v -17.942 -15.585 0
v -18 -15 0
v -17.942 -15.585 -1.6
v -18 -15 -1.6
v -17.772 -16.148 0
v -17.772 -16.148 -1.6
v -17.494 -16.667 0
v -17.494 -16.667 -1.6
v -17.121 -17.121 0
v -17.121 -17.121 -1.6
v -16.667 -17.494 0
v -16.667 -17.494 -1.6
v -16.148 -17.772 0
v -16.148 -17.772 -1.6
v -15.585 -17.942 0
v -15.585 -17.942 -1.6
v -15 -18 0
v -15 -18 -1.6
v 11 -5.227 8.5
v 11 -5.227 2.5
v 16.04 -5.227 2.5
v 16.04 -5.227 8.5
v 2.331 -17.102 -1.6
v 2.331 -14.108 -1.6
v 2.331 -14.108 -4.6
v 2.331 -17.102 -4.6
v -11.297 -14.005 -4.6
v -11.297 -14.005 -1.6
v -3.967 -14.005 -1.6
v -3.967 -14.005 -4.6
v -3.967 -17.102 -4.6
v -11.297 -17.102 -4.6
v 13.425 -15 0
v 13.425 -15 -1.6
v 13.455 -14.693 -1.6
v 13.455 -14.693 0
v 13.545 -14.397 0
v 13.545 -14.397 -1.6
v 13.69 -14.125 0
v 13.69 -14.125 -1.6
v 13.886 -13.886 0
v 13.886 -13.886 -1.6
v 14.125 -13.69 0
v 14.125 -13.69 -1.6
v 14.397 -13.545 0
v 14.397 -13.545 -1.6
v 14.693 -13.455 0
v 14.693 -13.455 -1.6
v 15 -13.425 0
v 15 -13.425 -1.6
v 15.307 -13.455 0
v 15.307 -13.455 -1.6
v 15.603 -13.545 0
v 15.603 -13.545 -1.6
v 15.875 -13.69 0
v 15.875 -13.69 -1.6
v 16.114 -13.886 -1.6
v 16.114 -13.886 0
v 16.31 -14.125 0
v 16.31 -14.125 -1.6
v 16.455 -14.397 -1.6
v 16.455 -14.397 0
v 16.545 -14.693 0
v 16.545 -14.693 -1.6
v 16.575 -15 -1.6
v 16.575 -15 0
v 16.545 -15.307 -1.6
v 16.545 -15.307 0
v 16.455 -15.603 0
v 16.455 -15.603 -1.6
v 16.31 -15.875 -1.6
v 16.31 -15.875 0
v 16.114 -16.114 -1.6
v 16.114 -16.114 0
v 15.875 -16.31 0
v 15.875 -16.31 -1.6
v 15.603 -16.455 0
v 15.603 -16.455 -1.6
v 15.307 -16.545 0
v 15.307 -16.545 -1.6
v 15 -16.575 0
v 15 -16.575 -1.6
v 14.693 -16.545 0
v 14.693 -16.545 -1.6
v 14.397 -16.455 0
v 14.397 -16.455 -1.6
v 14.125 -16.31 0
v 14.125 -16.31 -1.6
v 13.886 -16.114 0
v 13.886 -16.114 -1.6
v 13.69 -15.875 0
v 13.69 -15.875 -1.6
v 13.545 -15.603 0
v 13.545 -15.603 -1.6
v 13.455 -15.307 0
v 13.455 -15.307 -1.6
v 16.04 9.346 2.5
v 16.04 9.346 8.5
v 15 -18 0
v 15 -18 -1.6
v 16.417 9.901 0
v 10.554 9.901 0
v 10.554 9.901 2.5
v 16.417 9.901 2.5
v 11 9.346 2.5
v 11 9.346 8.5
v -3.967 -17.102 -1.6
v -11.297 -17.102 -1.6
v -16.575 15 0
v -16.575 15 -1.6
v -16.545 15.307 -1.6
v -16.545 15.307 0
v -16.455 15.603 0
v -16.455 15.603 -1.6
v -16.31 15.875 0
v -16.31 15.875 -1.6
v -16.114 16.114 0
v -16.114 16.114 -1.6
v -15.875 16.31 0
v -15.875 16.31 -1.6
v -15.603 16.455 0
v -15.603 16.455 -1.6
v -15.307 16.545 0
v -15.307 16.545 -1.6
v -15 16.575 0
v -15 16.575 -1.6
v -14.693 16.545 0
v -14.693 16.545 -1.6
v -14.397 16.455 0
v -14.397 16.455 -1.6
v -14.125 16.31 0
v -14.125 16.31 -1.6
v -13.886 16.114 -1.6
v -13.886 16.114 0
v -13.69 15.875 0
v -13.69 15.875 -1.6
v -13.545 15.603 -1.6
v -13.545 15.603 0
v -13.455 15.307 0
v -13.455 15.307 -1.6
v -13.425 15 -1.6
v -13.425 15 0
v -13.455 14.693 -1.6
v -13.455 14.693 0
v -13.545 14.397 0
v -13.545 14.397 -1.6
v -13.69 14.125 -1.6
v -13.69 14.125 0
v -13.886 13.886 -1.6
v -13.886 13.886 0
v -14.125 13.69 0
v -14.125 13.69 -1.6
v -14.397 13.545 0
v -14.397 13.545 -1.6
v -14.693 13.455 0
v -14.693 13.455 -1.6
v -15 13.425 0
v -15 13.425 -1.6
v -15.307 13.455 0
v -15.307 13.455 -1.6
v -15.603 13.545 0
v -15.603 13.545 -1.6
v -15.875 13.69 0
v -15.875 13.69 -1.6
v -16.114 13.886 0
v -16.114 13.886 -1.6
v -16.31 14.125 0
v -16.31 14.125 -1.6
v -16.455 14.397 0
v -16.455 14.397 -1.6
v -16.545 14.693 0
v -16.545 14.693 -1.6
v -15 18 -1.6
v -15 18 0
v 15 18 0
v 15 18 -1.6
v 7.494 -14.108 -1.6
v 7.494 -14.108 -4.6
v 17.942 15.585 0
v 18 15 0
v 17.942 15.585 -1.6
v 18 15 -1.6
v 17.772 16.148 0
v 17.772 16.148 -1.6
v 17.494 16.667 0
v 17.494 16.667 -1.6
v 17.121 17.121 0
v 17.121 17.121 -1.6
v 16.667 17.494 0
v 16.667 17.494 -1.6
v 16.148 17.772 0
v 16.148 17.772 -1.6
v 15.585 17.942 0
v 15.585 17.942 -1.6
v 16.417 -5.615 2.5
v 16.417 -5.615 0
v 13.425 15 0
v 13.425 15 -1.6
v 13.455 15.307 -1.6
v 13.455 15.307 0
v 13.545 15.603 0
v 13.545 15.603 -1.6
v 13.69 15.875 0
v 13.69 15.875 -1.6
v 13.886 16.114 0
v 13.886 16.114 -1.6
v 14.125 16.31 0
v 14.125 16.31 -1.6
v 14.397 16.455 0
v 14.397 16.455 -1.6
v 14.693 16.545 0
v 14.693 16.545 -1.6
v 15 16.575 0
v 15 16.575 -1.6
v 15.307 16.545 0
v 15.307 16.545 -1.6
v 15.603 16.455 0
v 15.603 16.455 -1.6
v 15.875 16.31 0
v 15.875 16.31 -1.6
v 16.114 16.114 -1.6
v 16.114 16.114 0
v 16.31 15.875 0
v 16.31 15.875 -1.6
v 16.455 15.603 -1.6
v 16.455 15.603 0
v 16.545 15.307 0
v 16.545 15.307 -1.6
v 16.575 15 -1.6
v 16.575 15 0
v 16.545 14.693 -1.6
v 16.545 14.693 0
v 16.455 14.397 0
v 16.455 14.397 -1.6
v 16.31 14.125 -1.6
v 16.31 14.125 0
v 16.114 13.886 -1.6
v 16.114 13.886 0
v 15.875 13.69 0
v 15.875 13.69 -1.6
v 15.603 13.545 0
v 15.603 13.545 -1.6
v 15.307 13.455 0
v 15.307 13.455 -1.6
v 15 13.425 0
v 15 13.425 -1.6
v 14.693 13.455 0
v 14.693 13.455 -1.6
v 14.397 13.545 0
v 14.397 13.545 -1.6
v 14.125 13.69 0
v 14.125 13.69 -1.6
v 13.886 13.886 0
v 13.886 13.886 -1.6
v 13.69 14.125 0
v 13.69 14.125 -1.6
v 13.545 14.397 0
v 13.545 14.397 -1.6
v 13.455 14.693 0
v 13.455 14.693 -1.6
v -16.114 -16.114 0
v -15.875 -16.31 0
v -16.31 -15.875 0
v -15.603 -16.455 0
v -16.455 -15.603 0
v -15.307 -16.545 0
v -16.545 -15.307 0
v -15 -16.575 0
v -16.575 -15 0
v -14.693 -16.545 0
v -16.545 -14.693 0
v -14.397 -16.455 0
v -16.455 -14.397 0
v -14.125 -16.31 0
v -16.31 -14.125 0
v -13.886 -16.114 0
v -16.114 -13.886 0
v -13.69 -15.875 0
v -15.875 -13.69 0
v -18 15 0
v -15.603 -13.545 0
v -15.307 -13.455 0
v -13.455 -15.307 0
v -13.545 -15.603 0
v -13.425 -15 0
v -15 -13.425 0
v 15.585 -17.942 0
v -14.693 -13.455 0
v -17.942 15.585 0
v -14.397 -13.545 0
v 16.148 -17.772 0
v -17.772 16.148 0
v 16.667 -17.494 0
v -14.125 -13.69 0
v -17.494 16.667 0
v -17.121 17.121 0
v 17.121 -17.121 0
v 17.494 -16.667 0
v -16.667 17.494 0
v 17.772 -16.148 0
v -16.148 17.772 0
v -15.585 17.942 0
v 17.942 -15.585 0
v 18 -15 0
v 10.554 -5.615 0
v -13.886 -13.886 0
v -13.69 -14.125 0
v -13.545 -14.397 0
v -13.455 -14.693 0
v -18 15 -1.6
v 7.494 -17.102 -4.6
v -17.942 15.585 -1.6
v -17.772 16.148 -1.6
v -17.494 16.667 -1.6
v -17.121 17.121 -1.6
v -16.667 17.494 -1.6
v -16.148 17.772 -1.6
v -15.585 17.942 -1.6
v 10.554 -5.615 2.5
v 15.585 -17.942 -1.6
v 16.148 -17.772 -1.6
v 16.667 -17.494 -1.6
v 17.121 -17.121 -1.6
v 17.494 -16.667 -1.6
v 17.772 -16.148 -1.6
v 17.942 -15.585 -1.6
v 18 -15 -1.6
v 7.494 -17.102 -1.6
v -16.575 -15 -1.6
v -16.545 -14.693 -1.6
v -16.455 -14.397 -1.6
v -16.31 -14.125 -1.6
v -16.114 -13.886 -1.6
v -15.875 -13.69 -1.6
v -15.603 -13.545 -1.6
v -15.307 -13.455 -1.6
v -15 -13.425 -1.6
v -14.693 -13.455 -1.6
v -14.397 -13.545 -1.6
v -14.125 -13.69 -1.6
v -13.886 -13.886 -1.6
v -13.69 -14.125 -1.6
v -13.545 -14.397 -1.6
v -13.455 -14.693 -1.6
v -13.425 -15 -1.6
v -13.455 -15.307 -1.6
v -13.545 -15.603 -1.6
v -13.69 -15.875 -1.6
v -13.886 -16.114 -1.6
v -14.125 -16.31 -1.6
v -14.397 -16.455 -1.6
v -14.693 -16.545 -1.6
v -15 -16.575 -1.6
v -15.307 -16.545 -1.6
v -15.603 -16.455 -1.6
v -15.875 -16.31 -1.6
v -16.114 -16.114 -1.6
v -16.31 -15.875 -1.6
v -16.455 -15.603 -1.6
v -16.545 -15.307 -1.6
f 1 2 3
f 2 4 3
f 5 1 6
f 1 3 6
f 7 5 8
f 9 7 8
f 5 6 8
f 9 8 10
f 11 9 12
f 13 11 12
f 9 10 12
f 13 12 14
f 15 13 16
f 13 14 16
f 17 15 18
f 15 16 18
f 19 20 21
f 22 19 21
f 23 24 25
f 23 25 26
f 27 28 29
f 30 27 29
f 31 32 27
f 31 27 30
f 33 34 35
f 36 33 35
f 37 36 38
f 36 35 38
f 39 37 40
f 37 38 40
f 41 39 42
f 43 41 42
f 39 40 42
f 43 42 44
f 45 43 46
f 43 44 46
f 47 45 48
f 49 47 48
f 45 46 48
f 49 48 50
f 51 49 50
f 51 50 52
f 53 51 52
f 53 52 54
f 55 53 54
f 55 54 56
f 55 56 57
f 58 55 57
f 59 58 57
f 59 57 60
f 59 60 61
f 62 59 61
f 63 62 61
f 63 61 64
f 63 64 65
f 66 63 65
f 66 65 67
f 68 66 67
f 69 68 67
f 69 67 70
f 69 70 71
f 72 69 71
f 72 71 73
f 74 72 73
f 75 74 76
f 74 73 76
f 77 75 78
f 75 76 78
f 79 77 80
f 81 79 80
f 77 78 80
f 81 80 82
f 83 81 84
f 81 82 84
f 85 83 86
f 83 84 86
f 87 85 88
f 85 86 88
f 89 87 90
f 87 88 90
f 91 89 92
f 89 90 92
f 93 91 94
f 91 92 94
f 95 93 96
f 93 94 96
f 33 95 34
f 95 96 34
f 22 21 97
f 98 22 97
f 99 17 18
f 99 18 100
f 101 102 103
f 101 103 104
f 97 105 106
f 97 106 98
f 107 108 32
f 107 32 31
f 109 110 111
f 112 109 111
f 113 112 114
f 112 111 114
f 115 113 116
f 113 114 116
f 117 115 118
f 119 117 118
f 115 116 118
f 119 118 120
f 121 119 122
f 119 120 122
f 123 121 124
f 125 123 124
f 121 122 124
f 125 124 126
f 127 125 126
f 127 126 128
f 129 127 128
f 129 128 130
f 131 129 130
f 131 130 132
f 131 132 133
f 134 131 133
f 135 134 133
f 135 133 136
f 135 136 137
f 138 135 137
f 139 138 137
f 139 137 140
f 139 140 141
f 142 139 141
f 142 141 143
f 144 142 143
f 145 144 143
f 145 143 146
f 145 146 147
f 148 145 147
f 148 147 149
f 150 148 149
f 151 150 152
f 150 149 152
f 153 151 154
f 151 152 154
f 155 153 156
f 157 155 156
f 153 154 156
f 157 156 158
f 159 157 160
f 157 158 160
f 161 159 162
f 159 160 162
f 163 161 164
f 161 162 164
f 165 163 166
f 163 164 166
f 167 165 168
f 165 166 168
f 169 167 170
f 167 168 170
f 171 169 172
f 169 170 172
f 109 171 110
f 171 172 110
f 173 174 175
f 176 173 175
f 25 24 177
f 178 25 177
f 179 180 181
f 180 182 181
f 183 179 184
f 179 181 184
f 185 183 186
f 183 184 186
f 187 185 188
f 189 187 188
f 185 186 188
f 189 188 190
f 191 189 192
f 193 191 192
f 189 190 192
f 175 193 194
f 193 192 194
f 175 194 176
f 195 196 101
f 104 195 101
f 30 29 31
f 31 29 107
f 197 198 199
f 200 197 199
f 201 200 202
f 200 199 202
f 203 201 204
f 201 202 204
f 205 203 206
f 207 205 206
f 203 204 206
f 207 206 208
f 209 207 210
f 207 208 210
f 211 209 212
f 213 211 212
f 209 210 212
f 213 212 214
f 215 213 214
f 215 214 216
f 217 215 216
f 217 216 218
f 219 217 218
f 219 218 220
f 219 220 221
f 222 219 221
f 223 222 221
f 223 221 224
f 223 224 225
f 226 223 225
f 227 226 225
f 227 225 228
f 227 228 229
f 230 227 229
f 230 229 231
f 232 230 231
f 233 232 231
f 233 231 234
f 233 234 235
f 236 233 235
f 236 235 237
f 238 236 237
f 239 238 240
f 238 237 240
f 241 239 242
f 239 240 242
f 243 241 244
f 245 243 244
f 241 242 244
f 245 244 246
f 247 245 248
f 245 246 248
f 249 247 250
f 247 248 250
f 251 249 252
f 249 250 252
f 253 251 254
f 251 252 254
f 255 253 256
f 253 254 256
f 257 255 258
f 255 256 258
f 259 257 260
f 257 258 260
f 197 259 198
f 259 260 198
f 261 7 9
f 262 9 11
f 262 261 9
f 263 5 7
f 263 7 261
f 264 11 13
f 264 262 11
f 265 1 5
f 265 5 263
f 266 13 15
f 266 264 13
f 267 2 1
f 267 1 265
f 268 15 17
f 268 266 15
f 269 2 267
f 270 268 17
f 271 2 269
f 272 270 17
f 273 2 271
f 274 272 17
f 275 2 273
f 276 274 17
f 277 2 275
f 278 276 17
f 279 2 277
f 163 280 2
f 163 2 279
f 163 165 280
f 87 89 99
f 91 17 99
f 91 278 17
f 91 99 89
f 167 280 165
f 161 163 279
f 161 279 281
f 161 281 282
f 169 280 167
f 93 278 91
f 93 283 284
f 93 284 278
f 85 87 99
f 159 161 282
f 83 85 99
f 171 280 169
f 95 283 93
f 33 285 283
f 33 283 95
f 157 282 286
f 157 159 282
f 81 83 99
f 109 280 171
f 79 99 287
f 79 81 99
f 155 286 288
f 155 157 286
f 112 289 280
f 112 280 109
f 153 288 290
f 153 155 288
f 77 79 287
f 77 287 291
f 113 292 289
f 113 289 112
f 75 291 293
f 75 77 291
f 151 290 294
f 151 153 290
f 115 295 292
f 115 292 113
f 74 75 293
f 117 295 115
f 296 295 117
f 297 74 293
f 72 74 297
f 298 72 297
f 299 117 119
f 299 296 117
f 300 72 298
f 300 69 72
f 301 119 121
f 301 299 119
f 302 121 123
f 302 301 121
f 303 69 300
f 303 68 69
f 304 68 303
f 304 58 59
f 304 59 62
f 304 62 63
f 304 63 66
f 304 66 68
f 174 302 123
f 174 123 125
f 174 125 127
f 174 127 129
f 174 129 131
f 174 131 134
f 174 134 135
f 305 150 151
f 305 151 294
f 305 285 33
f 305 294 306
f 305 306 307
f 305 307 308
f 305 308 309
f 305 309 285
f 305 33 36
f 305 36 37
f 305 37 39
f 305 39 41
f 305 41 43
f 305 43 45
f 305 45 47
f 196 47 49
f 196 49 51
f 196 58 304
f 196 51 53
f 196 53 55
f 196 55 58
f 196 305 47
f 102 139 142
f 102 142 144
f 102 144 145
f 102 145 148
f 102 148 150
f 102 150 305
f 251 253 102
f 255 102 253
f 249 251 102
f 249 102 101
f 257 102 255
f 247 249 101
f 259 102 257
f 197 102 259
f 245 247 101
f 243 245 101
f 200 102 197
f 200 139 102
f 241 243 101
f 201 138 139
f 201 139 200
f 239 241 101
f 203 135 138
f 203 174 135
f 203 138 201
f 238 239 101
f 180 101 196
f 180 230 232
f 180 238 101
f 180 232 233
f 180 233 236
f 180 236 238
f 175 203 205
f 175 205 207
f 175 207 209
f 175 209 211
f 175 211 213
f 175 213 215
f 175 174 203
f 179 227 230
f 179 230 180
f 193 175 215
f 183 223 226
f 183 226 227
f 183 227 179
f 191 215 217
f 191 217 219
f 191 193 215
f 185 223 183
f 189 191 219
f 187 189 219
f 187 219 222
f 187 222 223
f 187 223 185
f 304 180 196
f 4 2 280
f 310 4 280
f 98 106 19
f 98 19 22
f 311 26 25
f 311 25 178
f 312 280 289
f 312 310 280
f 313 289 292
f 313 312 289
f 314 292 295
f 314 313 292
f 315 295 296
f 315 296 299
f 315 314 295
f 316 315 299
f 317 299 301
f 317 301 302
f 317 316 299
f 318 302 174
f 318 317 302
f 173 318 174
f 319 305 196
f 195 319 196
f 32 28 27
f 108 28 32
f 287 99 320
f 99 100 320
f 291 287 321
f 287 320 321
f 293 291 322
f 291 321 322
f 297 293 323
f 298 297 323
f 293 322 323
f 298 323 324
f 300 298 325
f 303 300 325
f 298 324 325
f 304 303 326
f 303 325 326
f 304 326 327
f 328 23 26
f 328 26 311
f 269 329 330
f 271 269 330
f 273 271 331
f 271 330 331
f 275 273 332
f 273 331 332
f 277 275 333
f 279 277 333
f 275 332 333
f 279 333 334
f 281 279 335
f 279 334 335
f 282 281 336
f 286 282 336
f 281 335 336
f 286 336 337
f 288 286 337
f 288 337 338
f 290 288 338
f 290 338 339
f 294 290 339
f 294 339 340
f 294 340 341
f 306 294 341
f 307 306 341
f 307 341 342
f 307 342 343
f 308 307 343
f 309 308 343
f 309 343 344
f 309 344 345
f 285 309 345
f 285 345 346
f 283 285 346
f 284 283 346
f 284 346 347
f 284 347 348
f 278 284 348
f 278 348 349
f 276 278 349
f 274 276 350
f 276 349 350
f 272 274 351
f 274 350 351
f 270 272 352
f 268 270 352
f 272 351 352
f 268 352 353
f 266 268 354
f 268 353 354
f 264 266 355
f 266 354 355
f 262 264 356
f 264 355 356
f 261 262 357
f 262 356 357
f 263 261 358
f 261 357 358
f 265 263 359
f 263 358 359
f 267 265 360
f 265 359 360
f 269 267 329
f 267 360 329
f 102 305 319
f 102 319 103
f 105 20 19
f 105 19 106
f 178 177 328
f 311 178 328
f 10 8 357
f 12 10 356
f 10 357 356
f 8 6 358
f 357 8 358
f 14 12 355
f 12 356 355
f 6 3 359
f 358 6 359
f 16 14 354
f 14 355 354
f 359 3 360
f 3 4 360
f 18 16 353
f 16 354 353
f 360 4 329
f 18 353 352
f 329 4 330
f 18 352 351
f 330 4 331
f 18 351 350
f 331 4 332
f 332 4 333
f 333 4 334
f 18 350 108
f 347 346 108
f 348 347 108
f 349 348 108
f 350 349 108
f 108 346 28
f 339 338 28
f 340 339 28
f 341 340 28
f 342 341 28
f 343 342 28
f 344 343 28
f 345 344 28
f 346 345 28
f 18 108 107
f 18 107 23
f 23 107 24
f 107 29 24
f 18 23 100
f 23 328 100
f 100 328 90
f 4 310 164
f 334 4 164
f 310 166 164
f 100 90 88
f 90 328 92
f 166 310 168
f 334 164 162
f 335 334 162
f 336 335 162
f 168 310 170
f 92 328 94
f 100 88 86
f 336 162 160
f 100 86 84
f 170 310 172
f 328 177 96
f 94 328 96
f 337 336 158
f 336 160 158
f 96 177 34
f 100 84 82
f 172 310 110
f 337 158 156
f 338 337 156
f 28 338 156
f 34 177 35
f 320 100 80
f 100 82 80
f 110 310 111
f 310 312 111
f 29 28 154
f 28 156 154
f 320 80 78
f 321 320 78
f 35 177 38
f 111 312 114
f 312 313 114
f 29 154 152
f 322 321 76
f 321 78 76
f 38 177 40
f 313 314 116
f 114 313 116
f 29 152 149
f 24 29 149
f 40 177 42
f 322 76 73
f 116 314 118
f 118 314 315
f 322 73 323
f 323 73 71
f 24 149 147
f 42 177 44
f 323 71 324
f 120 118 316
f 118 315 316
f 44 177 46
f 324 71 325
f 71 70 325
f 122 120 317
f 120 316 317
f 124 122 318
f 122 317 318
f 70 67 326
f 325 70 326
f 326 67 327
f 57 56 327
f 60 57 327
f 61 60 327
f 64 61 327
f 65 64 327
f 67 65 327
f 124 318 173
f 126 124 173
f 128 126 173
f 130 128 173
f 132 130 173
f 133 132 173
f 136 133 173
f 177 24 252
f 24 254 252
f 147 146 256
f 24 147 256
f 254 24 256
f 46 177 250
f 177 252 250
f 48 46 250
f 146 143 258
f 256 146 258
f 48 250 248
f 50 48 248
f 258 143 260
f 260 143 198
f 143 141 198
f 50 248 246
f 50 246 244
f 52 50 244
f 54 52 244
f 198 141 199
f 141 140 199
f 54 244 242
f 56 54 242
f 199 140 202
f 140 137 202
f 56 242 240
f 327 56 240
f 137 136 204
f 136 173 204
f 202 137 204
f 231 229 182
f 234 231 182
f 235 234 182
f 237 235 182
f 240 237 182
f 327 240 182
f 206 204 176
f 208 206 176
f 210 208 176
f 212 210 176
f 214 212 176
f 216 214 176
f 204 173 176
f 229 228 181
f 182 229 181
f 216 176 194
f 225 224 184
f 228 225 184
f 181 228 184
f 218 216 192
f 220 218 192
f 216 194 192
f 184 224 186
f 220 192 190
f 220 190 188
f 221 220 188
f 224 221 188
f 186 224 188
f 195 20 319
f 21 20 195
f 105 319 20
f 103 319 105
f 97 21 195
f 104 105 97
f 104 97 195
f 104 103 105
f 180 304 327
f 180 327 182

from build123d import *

# Parameters (mm, degrees)
F0_W     = 36
F0_H     = 36
F1_DEPTH = 1.6
F2_R     = 3
F3_D     = 3.15
F4_W     = 5.162462825
F4_H     = 2.9942281544
F4_W_2   = 7.3306979612
F4_H_2   = 3.097477369
F5_DEPTH = 3
F6_W     = 5.8629876003
F6_H     = 15.5157274567
F7_DEPTH = 2.5
F8_W     = 5.0398427993
F8_H     = 14.5735112019
F9_DEPTH = 6


with BuildPart() as f1:
    # F0 (on Top) → F1 (new body)
    with BuildSketch(Plane.XY):
        Rectangle(F0_W, F0_H)
    extrude(amount=-F1_DEPTH)

    # F2
    f2_edges = [f1.edges().sort_by_distance(p)[0] for p in [
        (18, -18, -0.8),
        (-18, -18, -0.8),
        (18, 18, -0.8),
        (-18, 18, -0.8),
    ]]
    fillet(f2_edges, radius=F2_R)

    # F3 (through all)
    with Locations(Plane.XY):
        with Locations((-15, 15), (15, 15), (15, -15), (-15, -15)):
            Hole(F3_D / 2)

    # F4 (on face) → F5 (join)
    with BuildSketch(Plane(origin=(0, 0, -1.6), x_dir=(1, 0, 0), z_dir=(0, 0, -1))):
        with Locations((4.9126524245, 15.6052540988)):
            Rectangle(F4_W, F4_H)
        with Locations((-7.6321330853, 15.5536294915)):
            Rectangle(F4_W_2, F4_H_2)
    extrude(amount=F5_DEPTH)

    # F6 (on face) → F7 (join)
    with BuildSketch(Plane.XY):
        with Locations((13.4858717211, 2.1426391322)):
            Rectangle(F6_W, F6_H)
    extrude(amount=F7_DEPTH)

    # F8 (on face) → F9 (join)
    with BuildSketch(Plane.XY.offset(2.5)):
        with Locations((13.5199902579, 2.0592806395)):
            Rectangle(F8_W, F8_H)
    extrude(amount=F9_DEPTH)


solid = f1.part
